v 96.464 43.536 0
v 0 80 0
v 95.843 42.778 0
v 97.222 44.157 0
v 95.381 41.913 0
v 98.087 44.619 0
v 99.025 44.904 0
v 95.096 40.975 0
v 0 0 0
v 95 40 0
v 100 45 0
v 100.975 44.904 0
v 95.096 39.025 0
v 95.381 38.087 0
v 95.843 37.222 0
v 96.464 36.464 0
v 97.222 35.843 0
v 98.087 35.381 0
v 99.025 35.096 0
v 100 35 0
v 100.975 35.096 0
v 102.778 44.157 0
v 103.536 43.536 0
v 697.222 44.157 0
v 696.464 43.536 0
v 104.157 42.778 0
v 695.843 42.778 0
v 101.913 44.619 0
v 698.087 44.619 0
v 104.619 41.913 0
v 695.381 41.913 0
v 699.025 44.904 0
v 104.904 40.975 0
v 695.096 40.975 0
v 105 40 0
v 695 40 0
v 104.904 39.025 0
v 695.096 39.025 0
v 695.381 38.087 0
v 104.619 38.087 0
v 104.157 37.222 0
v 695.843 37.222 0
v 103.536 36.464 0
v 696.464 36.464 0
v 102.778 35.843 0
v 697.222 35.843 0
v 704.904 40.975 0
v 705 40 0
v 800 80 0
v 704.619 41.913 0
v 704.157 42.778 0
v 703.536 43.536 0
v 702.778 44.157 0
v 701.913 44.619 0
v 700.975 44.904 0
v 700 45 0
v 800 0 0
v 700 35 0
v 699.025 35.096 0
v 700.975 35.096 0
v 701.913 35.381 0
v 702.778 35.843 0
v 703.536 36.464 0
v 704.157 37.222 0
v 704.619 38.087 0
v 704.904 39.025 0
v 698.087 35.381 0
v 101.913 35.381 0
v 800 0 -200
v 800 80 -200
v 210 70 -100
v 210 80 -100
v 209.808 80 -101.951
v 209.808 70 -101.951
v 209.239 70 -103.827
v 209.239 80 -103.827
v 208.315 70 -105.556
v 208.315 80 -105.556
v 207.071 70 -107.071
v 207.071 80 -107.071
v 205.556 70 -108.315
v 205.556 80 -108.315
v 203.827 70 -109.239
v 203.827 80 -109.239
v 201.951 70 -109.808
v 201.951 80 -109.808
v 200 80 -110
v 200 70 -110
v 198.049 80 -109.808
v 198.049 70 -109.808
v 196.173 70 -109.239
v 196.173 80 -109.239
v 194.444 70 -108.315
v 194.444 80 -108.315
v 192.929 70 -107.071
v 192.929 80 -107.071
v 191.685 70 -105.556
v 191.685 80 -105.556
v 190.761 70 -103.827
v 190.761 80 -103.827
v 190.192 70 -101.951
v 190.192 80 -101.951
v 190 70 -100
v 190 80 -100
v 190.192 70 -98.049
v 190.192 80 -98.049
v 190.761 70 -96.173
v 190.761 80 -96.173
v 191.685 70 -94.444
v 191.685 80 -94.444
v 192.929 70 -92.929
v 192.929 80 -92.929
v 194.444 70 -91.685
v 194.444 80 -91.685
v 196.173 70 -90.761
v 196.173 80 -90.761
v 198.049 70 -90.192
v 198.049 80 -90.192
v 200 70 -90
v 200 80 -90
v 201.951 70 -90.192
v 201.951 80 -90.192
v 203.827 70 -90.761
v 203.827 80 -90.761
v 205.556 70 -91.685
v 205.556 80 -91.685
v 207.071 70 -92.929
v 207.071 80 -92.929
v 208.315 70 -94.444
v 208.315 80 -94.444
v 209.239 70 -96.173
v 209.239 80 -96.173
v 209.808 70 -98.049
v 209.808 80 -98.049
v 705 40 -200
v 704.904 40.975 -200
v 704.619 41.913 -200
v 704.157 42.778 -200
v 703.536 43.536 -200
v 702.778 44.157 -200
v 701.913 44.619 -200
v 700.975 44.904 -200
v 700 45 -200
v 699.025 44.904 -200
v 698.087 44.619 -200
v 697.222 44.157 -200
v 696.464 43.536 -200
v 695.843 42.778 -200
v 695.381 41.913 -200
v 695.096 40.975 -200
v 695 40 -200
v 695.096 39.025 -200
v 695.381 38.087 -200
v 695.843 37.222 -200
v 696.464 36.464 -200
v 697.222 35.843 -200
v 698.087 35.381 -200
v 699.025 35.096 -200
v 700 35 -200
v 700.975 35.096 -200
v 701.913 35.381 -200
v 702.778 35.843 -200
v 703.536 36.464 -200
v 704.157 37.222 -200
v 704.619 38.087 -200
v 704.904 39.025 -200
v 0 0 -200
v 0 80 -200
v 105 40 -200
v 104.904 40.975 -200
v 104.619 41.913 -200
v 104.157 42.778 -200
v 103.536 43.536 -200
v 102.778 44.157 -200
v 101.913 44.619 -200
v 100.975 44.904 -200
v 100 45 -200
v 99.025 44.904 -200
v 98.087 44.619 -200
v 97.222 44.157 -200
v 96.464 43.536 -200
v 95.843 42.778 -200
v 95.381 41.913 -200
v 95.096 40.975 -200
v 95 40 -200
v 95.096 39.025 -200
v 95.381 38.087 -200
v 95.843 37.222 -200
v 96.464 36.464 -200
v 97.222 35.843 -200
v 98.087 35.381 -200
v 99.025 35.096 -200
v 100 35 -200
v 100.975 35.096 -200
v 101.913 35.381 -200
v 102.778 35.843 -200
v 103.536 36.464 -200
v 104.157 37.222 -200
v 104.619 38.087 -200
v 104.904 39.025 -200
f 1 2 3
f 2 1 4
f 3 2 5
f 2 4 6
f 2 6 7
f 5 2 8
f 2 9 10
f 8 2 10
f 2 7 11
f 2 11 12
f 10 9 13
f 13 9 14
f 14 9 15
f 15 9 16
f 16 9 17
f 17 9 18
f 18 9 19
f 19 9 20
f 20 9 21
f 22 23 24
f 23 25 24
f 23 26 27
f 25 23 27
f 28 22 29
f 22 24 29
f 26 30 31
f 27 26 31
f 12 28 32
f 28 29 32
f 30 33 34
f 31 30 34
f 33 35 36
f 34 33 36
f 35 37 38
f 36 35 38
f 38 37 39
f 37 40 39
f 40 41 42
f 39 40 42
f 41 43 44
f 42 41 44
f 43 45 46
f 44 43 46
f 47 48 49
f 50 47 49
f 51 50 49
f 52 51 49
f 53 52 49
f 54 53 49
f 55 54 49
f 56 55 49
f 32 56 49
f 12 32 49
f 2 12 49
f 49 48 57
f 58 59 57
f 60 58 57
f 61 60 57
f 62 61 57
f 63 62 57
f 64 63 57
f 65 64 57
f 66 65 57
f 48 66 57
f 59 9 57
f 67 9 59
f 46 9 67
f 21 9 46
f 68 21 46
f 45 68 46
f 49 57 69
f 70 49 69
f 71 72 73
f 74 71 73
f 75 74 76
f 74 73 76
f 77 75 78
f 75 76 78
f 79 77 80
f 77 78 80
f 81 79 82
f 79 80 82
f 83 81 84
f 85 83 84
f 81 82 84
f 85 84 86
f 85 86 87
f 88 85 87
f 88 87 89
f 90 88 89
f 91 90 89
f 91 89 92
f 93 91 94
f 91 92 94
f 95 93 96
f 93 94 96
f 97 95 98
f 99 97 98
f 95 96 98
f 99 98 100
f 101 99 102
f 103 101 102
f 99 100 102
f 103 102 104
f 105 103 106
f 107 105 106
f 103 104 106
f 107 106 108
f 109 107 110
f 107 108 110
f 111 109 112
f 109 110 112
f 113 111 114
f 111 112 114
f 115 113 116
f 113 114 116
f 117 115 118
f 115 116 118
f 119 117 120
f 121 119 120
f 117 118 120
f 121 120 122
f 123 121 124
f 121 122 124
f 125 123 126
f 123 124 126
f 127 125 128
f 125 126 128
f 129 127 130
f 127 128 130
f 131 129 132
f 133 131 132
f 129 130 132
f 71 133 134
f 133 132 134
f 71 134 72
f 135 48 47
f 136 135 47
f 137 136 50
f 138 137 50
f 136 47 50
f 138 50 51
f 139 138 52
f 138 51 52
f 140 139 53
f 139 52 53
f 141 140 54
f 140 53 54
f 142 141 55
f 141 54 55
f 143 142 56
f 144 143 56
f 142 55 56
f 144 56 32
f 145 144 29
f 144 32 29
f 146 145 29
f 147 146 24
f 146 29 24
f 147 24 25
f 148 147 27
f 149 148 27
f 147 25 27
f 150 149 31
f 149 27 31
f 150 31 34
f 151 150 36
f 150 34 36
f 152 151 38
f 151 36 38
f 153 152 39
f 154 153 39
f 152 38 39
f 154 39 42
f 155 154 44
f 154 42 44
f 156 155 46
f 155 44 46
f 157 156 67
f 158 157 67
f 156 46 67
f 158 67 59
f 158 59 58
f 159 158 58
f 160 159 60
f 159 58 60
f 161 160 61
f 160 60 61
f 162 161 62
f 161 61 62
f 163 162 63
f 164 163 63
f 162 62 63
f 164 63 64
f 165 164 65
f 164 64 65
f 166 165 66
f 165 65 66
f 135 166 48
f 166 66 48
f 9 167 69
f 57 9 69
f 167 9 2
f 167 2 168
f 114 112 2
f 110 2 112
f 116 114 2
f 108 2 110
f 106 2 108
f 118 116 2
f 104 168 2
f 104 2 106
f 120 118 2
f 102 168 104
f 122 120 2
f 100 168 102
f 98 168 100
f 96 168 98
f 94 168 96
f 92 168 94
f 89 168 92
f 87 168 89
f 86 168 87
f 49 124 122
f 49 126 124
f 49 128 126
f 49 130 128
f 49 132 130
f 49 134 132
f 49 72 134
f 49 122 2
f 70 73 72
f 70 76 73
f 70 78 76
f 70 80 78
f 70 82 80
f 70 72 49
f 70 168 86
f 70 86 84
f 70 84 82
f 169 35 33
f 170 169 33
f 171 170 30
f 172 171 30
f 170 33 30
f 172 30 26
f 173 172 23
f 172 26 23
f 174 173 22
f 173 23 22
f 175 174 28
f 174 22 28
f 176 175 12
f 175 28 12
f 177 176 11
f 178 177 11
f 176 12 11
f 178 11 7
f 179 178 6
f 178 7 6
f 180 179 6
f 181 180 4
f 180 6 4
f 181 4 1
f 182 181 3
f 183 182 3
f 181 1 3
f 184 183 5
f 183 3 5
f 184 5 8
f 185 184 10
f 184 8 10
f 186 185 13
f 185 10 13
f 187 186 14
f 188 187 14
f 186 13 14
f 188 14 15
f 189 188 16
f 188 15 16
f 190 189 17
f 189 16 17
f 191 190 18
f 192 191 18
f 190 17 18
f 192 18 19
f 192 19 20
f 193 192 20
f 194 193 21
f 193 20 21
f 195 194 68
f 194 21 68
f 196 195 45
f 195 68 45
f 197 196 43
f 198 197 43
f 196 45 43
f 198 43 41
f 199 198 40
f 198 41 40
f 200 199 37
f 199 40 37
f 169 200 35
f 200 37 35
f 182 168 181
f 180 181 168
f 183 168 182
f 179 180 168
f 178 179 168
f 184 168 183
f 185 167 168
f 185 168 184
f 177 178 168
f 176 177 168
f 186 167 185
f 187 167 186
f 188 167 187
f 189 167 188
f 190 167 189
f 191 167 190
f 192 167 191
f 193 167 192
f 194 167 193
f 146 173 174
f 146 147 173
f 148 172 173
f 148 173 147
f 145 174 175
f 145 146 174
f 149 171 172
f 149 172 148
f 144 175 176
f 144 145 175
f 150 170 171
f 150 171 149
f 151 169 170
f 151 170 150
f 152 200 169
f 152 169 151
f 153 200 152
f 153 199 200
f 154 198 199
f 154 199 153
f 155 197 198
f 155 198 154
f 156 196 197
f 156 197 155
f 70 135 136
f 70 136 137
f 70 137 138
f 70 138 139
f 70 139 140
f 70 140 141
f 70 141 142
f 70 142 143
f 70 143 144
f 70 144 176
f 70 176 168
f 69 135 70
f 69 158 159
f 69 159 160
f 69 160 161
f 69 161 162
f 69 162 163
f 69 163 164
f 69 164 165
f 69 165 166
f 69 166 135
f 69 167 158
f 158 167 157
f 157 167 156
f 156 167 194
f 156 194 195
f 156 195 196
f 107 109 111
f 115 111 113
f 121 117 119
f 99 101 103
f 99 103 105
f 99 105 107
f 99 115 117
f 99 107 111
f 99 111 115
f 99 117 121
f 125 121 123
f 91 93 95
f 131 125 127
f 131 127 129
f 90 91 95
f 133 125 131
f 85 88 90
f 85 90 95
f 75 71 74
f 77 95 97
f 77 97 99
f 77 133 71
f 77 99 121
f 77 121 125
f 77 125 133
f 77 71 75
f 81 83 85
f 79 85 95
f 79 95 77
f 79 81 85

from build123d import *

# Parameters (mm, degrees)
SKETCH1_W           = 800
SKETCH1_H           = 200
BOSS_EXTRUDE1_DEPTH = 80
SKETCH3_R           = 5
CUT_EXTRUDE2_DEPTH  = 200
SKETCH4_R           = 10
CUT_EXTRUDE3_DEPTH  = 10


with BuildPart() as part:
    # Sketch1 → Boss-Extrude1 (new body)
    with BuildSketch(Plane(origin=(0, 0, 0), x_dir=(1, 0, 0), z_dir=(0, 1, 0))):
        with Locations((400, 100)):
            Rectangle(SKETCH1_W, SKETCH1_H)
    extrude(amount=BOSS_EXTRUDE1_DEPTH)

    # Sketch3 → Cut-Extrude2 (cut)
    with BuildSketch(Plane.XY):
        with Locations((100, 40)):
            Circle(SKETCH3_R)
        with Locations((700, 40)):
            Circle(SKETCH3_R)
    extrude(amount=-CUT_EXTRUDE2_DEPTH, mode=Mode.SUBTRACT)

    # Sketch4 → Cut-Extrude3 (cut)
    with BuildSketch(Plane(origin=(0, 80, 0), x_dir=(1, 0, 0), z_dir=(0, 1, 0))):
        with Locations((200, 100)):
            Circle(SKETCH4_R)
    extrude(amount=-CUT_EXTRUDE3_DEPTH, mode=Mode.SUBTRACT)


solid = part.part
